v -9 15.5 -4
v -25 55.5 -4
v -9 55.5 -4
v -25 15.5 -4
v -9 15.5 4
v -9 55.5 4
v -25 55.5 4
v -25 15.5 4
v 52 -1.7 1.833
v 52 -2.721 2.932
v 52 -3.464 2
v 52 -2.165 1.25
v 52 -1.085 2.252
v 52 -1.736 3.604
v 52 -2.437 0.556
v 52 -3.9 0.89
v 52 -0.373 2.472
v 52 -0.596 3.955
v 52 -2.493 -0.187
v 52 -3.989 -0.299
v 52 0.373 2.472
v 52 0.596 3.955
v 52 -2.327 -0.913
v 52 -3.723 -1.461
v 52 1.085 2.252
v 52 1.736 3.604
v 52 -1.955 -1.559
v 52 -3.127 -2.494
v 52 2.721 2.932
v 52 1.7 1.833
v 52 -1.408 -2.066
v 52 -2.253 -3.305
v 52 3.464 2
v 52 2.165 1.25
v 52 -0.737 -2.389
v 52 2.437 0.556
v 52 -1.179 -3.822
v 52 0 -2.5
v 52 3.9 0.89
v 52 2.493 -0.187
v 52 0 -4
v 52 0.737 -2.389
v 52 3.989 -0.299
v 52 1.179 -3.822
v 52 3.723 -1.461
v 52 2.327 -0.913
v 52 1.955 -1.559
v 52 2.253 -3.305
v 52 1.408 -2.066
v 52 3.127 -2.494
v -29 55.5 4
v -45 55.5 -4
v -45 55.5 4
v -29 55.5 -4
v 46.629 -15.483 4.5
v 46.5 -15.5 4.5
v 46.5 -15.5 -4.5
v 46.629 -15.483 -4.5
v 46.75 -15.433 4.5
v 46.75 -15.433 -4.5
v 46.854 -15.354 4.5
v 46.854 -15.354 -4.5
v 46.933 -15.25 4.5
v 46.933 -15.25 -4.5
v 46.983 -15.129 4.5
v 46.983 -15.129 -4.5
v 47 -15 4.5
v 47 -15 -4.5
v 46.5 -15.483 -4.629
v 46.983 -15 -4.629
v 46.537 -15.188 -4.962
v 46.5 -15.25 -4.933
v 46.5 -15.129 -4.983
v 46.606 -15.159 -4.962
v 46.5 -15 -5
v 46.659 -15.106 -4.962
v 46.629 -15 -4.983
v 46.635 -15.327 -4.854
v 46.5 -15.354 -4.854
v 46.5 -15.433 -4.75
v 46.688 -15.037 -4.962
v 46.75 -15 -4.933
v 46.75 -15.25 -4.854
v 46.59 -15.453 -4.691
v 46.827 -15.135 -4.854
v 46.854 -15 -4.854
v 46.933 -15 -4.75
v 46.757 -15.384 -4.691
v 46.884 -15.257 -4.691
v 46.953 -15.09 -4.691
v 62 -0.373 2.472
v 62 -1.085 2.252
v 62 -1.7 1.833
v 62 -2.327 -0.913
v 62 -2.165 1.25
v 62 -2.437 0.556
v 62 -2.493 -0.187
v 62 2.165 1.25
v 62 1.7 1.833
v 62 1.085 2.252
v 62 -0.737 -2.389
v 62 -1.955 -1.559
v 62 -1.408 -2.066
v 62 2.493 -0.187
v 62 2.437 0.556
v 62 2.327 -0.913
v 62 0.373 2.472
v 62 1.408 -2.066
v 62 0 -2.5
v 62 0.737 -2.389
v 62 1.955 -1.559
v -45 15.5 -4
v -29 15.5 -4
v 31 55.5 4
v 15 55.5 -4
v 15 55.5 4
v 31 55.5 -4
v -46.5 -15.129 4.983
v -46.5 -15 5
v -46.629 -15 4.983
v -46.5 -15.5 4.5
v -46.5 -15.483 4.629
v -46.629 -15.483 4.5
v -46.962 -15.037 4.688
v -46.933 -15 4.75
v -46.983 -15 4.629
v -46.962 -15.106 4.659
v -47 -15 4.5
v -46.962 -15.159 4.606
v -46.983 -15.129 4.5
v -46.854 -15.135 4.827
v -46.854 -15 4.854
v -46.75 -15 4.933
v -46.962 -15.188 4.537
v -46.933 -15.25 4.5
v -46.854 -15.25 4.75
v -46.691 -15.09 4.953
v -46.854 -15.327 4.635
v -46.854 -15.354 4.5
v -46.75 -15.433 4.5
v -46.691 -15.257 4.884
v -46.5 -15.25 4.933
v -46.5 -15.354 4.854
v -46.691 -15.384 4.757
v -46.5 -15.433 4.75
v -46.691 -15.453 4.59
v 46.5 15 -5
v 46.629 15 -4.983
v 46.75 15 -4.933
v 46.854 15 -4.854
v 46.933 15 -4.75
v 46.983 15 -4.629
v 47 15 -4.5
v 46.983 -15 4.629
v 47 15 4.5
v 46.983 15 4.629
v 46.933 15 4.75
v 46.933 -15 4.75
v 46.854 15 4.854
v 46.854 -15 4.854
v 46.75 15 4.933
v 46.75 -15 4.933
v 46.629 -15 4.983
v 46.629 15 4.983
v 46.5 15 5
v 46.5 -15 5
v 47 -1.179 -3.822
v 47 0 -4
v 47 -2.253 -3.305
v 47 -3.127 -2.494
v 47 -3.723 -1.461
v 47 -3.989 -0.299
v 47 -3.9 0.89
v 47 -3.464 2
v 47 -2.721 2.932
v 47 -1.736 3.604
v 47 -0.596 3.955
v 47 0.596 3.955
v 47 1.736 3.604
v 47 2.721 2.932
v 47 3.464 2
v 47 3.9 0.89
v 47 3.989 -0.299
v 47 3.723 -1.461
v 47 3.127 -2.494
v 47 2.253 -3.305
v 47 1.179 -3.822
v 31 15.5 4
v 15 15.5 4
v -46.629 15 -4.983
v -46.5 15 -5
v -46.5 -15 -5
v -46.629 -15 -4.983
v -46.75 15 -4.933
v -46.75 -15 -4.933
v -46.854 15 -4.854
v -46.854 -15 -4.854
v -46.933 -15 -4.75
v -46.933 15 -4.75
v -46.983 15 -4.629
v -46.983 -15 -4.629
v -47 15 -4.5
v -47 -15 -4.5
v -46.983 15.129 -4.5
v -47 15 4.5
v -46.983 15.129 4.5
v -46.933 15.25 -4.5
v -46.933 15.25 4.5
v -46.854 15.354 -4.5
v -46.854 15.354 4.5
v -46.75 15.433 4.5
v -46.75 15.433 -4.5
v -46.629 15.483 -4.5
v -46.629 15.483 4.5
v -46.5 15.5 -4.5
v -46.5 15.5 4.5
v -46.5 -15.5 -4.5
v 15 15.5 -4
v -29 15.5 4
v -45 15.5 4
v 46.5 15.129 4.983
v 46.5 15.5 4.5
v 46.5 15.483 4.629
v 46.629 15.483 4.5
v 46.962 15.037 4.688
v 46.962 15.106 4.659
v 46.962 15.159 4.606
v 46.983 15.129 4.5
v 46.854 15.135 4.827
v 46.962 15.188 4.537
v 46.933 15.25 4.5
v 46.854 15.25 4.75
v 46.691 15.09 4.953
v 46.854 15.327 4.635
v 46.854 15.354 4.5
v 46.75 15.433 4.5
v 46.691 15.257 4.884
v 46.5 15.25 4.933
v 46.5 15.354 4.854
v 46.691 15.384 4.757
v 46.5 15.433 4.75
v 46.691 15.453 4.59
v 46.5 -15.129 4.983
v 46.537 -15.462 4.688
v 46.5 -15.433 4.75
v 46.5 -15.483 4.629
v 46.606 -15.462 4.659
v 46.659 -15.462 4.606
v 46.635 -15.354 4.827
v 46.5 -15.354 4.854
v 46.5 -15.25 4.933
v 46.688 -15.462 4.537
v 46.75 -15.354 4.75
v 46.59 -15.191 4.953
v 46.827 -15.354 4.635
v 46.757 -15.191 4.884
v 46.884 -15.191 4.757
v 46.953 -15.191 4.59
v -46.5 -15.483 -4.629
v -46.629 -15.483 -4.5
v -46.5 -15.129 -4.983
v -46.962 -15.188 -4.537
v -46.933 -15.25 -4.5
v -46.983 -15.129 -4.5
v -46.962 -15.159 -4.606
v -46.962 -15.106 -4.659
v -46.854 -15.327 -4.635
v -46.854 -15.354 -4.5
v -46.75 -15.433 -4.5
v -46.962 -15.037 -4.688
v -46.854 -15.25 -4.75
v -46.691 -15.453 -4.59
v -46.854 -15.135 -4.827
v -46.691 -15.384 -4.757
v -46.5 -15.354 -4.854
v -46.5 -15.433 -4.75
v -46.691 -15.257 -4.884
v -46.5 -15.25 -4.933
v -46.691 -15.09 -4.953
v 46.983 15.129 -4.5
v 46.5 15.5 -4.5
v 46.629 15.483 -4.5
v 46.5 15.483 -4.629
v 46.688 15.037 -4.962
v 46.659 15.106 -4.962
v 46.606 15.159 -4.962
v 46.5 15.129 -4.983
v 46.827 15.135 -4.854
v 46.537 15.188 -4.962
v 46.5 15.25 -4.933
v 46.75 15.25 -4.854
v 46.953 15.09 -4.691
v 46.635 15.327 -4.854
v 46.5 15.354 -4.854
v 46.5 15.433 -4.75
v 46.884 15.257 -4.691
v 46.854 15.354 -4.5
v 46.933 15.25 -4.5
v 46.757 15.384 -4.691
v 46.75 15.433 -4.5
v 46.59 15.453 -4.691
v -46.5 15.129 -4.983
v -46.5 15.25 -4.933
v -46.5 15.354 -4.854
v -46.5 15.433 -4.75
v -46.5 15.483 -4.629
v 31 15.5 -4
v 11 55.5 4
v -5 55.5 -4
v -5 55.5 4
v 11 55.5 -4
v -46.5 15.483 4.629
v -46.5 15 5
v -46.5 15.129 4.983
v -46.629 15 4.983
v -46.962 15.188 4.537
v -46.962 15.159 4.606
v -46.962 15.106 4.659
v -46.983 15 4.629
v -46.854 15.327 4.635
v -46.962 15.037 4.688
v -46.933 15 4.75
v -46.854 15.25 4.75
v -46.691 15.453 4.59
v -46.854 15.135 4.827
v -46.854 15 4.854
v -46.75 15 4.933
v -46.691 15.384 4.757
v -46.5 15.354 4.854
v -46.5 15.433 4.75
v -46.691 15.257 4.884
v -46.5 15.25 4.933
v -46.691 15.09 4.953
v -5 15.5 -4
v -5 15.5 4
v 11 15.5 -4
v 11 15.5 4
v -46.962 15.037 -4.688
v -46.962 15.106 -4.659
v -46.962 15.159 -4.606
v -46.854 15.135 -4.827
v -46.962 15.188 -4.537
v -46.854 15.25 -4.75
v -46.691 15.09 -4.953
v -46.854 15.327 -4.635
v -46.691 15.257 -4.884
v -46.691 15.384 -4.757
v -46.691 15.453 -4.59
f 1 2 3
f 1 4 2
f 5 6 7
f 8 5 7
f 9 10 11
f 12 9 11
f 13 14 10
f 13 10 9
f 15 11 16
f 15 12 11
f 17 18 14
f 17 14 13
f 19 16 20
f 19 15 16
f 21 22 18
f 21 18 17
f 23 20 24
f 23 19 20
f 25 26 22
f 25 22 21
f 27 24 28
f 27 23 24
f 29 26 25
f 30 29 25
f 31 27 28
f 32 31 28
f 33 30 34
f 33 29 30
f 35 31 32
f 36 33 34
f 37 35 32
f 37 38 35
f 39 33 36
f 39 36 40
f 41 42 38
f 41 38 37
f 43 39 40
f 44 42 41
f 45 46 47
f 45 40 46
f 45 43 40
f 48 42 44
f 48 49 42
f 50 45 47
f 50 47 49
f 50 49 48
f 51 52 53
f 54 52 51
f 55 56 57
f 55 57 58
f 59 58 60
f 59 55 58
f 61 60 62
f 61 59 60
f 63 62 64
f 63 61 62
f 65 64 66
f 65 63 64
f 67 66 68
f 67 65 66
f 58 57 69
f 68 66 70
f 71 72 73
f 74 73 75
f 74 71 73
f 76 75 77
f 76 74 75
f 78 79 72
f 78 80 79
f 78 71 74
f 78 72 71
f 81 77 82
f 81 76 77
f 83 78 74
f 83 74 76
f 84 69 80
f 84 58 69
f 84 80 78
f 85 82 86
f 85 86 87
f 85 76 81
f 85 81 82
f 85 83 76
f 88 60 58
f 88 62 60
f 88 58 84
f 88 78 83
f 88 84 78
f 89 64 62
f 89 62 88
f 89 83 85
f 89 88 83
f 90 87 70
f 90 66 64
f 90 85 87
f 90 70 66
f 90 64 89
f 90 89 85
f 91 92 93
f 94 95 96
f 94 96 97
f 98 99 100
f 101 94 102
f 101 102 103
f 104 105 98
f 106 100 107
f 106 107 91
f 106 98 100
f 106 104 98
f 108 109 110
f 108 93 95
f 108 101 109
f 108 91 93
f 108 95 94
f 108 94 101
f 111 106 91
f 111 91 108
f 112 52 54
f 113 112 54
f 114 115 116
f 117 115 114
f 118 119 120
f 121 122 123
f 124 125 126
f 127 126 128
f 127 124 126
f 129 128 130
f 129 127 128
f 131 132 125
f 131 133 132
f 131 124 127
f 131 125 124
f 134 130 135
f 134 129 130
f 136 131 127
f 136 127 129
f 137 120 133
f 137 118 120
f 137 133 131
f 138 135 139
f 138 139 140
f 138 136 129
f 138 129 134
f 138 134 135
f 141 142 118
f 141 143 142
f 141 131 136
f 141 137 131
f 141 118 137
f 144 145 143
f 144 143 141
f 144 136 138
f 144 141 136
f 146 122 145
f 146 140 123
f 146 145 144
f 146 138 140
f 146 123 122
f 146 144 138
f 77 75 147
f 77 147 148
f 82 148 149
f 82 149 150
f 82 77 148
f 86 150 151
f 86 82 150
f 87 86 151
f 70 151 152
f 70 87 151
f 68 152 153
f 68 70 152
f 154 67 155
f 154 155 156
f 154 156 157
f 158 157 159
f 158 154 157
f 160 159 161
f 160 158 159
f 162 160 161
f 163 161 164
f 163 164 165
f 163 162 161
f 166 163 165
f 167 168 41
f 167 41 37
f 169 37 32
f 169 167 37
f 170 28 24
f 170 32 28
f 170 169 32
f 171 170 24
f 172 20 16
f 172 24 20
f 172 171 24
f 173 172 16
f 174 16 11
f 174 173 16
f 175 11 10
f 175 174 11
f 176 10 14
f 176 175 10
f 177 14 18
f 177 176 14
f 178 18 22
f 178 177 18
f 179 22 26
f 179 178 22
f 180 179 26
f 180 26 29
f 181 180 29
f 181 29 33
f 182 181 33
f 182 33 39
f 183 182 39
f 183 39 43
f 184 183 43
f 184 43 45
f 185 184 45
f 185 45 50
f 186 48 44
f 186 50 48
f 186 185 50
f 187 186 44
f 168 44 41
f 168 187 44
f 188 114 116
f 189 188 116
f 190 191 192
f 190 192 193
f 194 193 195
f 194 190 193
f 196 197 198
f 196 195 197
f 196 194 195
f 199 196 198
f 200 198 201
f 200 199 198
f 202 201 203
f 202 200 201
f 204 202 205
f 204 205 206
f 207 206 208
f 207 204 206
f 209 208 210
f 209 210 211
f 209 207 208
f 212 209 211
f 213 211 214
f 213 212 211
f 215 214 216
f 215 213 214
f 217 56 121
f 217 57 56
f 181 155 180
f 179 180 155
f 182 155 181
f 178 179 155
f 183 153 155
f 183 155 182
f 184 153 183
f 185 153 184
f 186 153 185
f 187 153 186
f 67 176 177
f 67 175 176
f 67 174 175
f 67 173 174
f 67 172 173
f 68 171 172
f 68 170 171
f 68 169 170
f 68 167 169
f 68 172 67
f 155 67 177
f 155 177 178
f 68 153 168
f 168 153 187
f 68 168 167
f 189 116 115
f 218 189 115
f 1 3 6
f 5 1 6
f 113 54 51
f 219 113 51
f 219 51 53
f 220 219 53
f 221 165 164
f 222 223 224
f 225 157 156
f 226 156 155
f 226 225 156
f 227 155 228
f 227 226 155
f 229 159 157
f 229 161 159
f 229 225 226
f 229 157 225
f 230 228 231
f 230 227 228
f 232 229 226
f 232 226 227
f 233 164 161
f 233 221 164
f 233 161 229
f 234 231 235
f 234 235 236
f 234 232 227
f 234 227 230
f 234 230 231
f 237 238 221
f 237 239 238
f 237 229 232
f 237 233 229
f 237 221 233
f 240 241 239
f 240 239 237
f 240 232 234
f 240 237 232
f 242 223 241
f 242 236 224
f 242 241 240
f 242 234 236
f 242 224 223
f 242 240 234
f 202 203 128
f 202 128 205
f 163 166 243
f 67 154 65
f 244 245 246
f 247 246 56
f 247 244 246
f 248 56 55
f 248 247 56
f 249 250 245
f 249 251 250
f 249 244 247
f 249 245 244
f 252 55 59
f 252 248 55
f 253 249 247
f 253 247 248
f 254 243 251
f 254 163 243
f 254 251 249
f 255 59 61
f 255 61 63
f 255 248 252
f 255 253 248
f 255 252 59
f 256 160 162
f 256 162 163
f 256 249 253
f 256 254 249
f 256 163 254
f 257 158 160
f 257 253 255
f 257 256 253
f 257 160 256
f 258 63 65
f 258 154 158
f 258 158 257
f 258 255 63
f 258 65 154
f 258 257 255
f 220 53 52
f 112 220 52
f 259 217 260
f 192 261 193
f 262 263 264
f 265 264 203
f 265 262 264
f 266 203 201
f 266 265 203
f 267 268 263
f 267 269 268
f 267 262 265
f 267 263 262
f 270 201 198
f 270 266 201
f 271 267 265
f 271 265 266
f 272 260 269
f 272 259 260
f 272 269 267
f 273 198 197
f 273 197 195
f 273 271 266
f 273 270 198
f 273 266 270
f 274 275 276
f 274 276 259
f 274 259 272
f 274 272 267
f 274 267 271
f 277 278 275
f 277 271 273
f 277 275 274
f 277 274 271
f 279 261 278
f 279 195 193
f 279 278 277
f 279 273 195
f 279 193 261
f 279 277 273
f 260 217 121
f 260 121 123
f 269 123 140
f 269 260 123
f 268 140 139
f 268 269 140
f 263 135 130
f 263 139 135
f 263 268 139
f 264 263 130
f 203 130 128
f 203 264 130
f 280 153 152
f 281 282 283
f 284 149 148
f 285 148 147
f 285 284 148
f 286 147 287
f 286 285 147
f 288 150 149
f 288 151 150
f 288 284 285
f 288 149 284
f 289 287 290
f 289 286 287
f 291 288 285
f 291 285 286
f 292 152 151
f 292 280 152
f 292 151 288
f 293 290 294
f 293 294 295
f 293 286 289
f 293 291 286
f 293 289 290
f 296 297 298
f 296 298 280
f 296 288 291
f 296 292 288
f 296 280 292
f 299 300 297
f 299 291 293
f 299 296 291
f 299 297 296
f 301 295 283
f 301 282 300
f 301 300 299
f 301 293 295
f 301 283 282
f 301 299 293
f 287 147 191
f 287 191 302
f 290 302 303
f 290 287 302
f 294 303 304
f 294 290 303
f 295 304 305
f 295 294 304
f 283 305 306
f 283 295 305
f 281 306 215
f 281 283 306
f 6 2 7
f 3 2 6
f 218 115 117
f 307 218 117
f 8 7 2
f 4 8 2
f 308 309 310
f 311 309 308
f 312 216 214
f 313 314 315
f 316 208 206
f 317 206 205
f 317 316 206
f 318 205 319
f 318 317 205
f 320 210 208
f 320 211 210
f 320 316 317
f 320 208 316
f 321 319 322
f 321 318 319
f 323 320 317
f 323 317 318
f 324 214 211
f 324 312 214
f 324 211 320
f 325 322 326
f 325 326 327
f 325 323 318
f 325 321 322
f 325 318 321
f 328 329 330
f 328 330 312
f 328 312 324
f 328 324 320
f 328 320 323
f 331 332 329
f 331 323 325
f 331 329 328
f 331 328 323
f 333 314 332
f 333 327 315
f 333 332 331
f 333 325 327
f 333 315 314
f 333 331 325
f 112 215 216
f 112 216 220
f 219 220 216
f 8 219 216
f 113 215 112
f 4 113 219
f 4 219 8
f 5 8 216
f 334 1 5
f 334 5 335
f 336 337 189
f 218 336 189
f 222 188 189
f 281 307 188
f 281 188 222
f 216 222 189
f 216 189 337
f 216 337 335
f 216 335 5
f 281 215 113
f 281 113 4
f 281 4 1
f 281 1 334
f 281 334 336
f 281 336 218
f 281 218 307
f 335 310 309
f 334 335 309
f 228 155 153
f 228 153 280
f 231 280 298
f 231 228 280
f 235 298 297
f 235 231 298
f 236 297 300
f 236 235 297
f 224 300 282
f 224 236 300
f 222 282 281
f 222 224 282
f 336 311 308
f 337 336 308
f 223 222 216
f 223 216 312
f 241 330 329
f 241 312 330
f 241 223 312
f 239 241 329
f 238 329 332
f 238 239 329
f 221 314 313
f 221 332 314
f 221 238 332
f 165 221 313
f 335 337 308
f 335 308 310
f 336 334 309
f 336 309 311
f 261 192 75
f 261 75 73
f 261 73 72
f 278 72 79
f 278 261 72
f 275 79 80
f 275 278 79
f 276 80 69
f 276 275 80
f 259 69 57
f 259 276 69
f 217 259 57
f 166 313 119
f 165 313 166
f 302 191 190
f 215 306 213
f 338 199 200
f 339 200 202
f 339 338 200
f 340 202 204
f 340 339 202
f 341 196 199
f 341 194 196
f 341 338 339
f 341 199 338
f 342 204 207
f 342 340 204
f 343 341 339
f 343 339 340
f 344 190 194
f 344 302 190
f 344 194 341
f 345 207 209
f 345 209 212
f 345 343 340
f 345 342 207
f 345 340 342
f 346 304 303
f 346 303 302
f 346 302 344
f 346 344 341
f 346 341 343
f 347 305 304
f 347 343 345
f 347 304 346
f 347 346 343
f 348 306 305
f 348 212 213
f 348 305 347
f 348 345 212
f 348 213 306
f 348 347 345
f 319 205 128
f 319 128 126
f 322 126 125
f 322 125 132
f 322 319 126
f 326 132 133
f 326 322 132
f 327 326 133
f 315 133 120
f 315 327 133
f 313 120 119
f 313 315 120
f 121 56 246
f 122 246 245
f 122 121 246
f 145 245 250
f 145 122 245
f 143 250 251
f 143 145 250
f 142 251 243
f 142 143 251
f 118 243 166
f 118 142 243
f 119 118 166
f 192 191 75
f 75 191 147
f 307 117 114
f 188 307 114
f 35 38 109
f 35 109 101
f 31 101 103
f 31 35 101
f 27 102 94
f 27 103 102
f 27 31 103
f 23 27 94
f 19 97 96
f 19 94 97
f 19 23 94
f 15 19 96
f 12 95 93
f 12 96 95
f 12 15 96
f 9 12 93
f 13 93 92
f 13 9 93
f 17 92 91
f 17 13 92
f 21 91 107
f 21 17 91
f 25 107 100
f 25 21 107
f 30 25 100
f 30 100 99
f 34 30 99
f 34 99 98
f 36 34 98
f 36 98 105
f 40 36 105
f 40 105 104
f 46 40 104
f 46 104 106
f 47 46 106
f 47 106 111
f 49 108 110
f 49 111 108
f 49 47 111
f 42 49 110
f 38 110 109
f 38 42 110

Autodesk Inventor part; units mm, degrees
ref_plane "YZ Plane" through (0, 0, 0) normal (1, 0, 0) x (0, 1, 0)
ref_plane "XZ Plane" through (0, 0, 0) normal (0, 1, 0) x (-1, 0, 0)
ref_plane "XY Plane" through (0, 0, 0) normal (0, 0, 1) x (1, 0, 0)
sketch "スケッチ1" plane through (0, 0, 0) normal (0, 0, 1) x (1, 0, 0)
  line L0 (47, -15.5) -> (-47, -15.5)
  line L1 (-47, -15.5) -> (-47, 15.5)
  line L2 (-47, 15.5) -> (47, 15.5)
  line L3 (47, 15.5) -> (47, -15.5)
  line L4 (47, -15.5) -> (-47, 15.5) construction
  line L5 (-47, -15.5) -> (47, 15.5) construction
  point P0 (0, 0)
  dimension "d0" = 94
  dimension "d1" = 31
extrude "押し出し1" add sketch "スケッチ1" along normal mid plane 10
sketch "スケッチ2" plane through (47, -15.5, 5) normal (1, 0, 0) x (0, 0, -1)
  circle A0 centre (5, 15.5) radius 4
  dimension "d4" = 8
extrude "押し出し2" add sketch "スケッチ2" along normal blind 5
sketch "スケッチ3" plane through (52, 0, 0) normal (1, 0, 0) x (0, 0, -1)
  circle A0 centre (0, 0) radius 2.5
  dimension "d7" = 5
extrude "押し出し3" add sketch "スケッチ3" along normal blind 10
fillet "フィレット1" radius 0.5 12 edges at (0, 15.5, 5) (47, 0, 5) (47, 15.5, 0) (47, -15.5, 0) (0, -15.5, 5) (0, 15.5, -5) (0, -15.5, -5) (47, 0, -5) (-47, 0, 5) (-47, 15.5, 0) (-47, 0, -5) (-47, -15.5, 0)
sketch "スケッチ4" plane through (-46.5, 15.5, -4.5) normal (0, 1, 0) x (1, 0, 0)
  line L0 (1.5, -0.5) -> (17.5, -0.5)
  line L1 (17.5, -0.5) -> (17.5, -8.5)
  line L2 (17.5, -8.5) -> (1.5, -8.5)
  line L3 (1.5, -8.5) -> (1.5, -0.5)
  line L4 (1.5, -0.5) -> (17.5, -8.5) construction
  line L5 (17.5, -0.5) -> (1.5, -8.5) construction
  line L6 (-0.5, 0) -> (-0.5, -9) projected
  point P0 (46.5, -4.5)
  point P1 (9.5, -4.5)
  point P2 (9.5, -4.5)
  dimension "d11" = 8
  dimension "d12" = 16
  dimension "d13" = 10
extrude "押し出し4" add sketch "スケッチ4" along normal blind 40
pattern_linear "矩形状パターン1" count 4 spacing 20 along (1, 0, 0) of "押し出し4"
properties part number "U3H-FC03BBK" material "ABS プラスチック"
